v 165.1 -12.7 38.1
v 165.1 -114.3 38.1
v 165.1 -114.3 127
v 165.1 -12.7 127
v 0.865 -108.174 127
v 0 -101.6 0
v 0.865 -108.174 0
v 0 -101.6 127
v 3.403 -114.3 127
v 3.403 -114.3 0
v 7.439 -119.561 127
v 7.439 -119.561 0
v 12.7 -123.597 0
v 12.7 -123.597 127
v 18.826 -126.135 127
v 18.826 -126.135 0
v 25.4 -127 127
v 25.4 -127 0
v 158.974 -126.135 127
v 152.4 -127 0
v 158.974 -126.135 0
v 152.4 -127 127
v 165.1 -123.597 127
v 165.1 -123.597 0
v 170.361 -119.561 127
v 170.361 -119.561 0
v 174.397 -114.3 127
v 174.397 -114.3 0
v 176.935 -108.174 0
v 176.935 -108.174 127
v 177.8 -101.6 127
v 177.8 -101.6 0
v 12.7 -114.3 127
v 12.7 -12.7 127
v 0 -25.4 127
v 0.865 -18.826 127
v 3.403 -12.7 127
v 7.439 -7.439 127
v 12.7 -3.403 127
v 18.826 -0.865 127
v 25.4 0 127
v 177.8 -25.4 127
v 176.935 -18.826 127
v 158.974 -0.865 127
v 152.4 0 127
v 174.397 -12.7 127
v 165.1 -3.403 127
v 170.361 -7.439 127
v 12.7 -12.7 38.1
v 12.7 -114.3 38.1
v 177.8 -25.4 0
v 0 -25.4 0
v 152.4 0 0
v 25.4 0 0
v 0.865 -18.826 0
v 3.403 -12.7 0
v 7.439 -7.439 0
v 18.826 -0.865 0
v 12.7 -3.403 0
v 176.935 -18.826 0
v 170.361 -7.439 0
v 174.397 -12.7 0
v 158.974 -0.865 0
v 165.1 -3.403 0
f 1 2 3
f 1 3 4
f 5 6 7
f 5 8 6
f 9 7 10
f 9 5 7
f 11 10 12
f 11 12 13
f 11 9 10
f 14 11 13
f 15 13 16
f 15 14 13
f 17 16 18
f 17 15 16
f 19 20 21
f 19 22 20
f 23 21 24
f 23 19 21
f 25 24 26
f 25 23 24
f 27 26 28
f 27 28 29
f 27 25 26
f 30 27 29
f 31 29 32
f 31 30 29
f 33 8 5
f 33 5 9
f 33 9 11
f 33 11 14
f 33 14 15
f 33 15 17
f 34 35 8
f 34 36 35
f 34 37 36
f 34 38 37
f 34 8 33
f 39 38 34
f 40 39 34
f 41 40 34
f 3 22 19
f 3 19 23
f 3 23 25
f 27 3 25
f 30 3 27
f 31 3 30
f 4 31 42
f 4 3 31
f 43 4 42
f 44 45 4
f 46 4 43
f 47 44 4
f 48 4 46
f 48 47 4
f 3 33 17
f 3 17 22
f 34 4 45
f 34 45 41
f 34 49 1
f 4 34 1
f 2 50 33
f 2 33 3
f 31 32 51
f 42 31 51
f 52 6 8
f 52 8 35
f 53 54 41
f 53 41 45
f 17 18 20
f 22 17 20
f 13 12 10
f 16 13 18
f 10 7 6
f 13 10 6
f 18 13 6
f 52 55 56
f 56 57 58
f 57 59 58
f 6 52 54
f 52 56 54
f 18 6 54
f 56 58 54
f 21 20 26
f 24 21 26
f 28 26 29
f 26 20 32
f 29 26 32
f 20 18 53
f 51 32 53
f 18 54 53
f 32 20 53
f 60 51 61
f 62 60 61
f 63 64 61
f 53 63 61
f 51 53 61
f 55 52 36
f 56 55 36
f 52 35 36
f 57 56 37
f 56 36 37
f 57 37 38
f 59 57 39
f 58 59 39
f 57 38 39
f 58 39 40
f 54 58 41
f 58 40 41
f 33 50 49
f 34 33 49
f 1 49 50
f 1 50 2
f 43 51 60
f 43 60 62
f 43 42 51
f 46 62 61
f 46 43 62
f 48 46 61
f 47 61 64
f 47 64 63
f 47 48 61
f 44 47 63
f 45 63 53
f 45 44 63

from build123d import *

# Parameters (mm, degrees)
F0_W     = 177.8
F0_H     = 127
F1_DEPTH = 127
F2_T     = -12.7
F3_DEPTH = 25.4
F4_R     = 25.4


with BuildPart() as f1:
    # F0 (on Top) → F1 (new body)
    with BuildSketch(Plane.XY):
        with Locations((88.9, -63.5)):
            Rectangle(F0_W, F0_H)
    extrude(amount=F1_DEPTH)

    # F2
    f2_openings = [f1.faces().sort_by_distance(p)[0] for p in [
        (88.9, -63.5, 127),
    ]]
    offset(amount=F2_T, openings=f2_openings)

    # F3 (add): a face of the model
    f3_faces = [f1.faces().sort_by_distance(p)[0] for p in [
        (88.9, -63.5, 12.7),
    ]]
    extrude(f3_faces, amount=F3_DEPTH)

    # F4
    f4_edges = [f1.edges().sort_by_distance(p)[0] for p in [
        (177.8, 0, 63.5),
        (177.8, -127, 63.5),
        (0, 0, 63.5),
        (0, -127, 63.5),
    ]]
    fillet(f4_edges, radius=F4_R)


solid = f1.part
